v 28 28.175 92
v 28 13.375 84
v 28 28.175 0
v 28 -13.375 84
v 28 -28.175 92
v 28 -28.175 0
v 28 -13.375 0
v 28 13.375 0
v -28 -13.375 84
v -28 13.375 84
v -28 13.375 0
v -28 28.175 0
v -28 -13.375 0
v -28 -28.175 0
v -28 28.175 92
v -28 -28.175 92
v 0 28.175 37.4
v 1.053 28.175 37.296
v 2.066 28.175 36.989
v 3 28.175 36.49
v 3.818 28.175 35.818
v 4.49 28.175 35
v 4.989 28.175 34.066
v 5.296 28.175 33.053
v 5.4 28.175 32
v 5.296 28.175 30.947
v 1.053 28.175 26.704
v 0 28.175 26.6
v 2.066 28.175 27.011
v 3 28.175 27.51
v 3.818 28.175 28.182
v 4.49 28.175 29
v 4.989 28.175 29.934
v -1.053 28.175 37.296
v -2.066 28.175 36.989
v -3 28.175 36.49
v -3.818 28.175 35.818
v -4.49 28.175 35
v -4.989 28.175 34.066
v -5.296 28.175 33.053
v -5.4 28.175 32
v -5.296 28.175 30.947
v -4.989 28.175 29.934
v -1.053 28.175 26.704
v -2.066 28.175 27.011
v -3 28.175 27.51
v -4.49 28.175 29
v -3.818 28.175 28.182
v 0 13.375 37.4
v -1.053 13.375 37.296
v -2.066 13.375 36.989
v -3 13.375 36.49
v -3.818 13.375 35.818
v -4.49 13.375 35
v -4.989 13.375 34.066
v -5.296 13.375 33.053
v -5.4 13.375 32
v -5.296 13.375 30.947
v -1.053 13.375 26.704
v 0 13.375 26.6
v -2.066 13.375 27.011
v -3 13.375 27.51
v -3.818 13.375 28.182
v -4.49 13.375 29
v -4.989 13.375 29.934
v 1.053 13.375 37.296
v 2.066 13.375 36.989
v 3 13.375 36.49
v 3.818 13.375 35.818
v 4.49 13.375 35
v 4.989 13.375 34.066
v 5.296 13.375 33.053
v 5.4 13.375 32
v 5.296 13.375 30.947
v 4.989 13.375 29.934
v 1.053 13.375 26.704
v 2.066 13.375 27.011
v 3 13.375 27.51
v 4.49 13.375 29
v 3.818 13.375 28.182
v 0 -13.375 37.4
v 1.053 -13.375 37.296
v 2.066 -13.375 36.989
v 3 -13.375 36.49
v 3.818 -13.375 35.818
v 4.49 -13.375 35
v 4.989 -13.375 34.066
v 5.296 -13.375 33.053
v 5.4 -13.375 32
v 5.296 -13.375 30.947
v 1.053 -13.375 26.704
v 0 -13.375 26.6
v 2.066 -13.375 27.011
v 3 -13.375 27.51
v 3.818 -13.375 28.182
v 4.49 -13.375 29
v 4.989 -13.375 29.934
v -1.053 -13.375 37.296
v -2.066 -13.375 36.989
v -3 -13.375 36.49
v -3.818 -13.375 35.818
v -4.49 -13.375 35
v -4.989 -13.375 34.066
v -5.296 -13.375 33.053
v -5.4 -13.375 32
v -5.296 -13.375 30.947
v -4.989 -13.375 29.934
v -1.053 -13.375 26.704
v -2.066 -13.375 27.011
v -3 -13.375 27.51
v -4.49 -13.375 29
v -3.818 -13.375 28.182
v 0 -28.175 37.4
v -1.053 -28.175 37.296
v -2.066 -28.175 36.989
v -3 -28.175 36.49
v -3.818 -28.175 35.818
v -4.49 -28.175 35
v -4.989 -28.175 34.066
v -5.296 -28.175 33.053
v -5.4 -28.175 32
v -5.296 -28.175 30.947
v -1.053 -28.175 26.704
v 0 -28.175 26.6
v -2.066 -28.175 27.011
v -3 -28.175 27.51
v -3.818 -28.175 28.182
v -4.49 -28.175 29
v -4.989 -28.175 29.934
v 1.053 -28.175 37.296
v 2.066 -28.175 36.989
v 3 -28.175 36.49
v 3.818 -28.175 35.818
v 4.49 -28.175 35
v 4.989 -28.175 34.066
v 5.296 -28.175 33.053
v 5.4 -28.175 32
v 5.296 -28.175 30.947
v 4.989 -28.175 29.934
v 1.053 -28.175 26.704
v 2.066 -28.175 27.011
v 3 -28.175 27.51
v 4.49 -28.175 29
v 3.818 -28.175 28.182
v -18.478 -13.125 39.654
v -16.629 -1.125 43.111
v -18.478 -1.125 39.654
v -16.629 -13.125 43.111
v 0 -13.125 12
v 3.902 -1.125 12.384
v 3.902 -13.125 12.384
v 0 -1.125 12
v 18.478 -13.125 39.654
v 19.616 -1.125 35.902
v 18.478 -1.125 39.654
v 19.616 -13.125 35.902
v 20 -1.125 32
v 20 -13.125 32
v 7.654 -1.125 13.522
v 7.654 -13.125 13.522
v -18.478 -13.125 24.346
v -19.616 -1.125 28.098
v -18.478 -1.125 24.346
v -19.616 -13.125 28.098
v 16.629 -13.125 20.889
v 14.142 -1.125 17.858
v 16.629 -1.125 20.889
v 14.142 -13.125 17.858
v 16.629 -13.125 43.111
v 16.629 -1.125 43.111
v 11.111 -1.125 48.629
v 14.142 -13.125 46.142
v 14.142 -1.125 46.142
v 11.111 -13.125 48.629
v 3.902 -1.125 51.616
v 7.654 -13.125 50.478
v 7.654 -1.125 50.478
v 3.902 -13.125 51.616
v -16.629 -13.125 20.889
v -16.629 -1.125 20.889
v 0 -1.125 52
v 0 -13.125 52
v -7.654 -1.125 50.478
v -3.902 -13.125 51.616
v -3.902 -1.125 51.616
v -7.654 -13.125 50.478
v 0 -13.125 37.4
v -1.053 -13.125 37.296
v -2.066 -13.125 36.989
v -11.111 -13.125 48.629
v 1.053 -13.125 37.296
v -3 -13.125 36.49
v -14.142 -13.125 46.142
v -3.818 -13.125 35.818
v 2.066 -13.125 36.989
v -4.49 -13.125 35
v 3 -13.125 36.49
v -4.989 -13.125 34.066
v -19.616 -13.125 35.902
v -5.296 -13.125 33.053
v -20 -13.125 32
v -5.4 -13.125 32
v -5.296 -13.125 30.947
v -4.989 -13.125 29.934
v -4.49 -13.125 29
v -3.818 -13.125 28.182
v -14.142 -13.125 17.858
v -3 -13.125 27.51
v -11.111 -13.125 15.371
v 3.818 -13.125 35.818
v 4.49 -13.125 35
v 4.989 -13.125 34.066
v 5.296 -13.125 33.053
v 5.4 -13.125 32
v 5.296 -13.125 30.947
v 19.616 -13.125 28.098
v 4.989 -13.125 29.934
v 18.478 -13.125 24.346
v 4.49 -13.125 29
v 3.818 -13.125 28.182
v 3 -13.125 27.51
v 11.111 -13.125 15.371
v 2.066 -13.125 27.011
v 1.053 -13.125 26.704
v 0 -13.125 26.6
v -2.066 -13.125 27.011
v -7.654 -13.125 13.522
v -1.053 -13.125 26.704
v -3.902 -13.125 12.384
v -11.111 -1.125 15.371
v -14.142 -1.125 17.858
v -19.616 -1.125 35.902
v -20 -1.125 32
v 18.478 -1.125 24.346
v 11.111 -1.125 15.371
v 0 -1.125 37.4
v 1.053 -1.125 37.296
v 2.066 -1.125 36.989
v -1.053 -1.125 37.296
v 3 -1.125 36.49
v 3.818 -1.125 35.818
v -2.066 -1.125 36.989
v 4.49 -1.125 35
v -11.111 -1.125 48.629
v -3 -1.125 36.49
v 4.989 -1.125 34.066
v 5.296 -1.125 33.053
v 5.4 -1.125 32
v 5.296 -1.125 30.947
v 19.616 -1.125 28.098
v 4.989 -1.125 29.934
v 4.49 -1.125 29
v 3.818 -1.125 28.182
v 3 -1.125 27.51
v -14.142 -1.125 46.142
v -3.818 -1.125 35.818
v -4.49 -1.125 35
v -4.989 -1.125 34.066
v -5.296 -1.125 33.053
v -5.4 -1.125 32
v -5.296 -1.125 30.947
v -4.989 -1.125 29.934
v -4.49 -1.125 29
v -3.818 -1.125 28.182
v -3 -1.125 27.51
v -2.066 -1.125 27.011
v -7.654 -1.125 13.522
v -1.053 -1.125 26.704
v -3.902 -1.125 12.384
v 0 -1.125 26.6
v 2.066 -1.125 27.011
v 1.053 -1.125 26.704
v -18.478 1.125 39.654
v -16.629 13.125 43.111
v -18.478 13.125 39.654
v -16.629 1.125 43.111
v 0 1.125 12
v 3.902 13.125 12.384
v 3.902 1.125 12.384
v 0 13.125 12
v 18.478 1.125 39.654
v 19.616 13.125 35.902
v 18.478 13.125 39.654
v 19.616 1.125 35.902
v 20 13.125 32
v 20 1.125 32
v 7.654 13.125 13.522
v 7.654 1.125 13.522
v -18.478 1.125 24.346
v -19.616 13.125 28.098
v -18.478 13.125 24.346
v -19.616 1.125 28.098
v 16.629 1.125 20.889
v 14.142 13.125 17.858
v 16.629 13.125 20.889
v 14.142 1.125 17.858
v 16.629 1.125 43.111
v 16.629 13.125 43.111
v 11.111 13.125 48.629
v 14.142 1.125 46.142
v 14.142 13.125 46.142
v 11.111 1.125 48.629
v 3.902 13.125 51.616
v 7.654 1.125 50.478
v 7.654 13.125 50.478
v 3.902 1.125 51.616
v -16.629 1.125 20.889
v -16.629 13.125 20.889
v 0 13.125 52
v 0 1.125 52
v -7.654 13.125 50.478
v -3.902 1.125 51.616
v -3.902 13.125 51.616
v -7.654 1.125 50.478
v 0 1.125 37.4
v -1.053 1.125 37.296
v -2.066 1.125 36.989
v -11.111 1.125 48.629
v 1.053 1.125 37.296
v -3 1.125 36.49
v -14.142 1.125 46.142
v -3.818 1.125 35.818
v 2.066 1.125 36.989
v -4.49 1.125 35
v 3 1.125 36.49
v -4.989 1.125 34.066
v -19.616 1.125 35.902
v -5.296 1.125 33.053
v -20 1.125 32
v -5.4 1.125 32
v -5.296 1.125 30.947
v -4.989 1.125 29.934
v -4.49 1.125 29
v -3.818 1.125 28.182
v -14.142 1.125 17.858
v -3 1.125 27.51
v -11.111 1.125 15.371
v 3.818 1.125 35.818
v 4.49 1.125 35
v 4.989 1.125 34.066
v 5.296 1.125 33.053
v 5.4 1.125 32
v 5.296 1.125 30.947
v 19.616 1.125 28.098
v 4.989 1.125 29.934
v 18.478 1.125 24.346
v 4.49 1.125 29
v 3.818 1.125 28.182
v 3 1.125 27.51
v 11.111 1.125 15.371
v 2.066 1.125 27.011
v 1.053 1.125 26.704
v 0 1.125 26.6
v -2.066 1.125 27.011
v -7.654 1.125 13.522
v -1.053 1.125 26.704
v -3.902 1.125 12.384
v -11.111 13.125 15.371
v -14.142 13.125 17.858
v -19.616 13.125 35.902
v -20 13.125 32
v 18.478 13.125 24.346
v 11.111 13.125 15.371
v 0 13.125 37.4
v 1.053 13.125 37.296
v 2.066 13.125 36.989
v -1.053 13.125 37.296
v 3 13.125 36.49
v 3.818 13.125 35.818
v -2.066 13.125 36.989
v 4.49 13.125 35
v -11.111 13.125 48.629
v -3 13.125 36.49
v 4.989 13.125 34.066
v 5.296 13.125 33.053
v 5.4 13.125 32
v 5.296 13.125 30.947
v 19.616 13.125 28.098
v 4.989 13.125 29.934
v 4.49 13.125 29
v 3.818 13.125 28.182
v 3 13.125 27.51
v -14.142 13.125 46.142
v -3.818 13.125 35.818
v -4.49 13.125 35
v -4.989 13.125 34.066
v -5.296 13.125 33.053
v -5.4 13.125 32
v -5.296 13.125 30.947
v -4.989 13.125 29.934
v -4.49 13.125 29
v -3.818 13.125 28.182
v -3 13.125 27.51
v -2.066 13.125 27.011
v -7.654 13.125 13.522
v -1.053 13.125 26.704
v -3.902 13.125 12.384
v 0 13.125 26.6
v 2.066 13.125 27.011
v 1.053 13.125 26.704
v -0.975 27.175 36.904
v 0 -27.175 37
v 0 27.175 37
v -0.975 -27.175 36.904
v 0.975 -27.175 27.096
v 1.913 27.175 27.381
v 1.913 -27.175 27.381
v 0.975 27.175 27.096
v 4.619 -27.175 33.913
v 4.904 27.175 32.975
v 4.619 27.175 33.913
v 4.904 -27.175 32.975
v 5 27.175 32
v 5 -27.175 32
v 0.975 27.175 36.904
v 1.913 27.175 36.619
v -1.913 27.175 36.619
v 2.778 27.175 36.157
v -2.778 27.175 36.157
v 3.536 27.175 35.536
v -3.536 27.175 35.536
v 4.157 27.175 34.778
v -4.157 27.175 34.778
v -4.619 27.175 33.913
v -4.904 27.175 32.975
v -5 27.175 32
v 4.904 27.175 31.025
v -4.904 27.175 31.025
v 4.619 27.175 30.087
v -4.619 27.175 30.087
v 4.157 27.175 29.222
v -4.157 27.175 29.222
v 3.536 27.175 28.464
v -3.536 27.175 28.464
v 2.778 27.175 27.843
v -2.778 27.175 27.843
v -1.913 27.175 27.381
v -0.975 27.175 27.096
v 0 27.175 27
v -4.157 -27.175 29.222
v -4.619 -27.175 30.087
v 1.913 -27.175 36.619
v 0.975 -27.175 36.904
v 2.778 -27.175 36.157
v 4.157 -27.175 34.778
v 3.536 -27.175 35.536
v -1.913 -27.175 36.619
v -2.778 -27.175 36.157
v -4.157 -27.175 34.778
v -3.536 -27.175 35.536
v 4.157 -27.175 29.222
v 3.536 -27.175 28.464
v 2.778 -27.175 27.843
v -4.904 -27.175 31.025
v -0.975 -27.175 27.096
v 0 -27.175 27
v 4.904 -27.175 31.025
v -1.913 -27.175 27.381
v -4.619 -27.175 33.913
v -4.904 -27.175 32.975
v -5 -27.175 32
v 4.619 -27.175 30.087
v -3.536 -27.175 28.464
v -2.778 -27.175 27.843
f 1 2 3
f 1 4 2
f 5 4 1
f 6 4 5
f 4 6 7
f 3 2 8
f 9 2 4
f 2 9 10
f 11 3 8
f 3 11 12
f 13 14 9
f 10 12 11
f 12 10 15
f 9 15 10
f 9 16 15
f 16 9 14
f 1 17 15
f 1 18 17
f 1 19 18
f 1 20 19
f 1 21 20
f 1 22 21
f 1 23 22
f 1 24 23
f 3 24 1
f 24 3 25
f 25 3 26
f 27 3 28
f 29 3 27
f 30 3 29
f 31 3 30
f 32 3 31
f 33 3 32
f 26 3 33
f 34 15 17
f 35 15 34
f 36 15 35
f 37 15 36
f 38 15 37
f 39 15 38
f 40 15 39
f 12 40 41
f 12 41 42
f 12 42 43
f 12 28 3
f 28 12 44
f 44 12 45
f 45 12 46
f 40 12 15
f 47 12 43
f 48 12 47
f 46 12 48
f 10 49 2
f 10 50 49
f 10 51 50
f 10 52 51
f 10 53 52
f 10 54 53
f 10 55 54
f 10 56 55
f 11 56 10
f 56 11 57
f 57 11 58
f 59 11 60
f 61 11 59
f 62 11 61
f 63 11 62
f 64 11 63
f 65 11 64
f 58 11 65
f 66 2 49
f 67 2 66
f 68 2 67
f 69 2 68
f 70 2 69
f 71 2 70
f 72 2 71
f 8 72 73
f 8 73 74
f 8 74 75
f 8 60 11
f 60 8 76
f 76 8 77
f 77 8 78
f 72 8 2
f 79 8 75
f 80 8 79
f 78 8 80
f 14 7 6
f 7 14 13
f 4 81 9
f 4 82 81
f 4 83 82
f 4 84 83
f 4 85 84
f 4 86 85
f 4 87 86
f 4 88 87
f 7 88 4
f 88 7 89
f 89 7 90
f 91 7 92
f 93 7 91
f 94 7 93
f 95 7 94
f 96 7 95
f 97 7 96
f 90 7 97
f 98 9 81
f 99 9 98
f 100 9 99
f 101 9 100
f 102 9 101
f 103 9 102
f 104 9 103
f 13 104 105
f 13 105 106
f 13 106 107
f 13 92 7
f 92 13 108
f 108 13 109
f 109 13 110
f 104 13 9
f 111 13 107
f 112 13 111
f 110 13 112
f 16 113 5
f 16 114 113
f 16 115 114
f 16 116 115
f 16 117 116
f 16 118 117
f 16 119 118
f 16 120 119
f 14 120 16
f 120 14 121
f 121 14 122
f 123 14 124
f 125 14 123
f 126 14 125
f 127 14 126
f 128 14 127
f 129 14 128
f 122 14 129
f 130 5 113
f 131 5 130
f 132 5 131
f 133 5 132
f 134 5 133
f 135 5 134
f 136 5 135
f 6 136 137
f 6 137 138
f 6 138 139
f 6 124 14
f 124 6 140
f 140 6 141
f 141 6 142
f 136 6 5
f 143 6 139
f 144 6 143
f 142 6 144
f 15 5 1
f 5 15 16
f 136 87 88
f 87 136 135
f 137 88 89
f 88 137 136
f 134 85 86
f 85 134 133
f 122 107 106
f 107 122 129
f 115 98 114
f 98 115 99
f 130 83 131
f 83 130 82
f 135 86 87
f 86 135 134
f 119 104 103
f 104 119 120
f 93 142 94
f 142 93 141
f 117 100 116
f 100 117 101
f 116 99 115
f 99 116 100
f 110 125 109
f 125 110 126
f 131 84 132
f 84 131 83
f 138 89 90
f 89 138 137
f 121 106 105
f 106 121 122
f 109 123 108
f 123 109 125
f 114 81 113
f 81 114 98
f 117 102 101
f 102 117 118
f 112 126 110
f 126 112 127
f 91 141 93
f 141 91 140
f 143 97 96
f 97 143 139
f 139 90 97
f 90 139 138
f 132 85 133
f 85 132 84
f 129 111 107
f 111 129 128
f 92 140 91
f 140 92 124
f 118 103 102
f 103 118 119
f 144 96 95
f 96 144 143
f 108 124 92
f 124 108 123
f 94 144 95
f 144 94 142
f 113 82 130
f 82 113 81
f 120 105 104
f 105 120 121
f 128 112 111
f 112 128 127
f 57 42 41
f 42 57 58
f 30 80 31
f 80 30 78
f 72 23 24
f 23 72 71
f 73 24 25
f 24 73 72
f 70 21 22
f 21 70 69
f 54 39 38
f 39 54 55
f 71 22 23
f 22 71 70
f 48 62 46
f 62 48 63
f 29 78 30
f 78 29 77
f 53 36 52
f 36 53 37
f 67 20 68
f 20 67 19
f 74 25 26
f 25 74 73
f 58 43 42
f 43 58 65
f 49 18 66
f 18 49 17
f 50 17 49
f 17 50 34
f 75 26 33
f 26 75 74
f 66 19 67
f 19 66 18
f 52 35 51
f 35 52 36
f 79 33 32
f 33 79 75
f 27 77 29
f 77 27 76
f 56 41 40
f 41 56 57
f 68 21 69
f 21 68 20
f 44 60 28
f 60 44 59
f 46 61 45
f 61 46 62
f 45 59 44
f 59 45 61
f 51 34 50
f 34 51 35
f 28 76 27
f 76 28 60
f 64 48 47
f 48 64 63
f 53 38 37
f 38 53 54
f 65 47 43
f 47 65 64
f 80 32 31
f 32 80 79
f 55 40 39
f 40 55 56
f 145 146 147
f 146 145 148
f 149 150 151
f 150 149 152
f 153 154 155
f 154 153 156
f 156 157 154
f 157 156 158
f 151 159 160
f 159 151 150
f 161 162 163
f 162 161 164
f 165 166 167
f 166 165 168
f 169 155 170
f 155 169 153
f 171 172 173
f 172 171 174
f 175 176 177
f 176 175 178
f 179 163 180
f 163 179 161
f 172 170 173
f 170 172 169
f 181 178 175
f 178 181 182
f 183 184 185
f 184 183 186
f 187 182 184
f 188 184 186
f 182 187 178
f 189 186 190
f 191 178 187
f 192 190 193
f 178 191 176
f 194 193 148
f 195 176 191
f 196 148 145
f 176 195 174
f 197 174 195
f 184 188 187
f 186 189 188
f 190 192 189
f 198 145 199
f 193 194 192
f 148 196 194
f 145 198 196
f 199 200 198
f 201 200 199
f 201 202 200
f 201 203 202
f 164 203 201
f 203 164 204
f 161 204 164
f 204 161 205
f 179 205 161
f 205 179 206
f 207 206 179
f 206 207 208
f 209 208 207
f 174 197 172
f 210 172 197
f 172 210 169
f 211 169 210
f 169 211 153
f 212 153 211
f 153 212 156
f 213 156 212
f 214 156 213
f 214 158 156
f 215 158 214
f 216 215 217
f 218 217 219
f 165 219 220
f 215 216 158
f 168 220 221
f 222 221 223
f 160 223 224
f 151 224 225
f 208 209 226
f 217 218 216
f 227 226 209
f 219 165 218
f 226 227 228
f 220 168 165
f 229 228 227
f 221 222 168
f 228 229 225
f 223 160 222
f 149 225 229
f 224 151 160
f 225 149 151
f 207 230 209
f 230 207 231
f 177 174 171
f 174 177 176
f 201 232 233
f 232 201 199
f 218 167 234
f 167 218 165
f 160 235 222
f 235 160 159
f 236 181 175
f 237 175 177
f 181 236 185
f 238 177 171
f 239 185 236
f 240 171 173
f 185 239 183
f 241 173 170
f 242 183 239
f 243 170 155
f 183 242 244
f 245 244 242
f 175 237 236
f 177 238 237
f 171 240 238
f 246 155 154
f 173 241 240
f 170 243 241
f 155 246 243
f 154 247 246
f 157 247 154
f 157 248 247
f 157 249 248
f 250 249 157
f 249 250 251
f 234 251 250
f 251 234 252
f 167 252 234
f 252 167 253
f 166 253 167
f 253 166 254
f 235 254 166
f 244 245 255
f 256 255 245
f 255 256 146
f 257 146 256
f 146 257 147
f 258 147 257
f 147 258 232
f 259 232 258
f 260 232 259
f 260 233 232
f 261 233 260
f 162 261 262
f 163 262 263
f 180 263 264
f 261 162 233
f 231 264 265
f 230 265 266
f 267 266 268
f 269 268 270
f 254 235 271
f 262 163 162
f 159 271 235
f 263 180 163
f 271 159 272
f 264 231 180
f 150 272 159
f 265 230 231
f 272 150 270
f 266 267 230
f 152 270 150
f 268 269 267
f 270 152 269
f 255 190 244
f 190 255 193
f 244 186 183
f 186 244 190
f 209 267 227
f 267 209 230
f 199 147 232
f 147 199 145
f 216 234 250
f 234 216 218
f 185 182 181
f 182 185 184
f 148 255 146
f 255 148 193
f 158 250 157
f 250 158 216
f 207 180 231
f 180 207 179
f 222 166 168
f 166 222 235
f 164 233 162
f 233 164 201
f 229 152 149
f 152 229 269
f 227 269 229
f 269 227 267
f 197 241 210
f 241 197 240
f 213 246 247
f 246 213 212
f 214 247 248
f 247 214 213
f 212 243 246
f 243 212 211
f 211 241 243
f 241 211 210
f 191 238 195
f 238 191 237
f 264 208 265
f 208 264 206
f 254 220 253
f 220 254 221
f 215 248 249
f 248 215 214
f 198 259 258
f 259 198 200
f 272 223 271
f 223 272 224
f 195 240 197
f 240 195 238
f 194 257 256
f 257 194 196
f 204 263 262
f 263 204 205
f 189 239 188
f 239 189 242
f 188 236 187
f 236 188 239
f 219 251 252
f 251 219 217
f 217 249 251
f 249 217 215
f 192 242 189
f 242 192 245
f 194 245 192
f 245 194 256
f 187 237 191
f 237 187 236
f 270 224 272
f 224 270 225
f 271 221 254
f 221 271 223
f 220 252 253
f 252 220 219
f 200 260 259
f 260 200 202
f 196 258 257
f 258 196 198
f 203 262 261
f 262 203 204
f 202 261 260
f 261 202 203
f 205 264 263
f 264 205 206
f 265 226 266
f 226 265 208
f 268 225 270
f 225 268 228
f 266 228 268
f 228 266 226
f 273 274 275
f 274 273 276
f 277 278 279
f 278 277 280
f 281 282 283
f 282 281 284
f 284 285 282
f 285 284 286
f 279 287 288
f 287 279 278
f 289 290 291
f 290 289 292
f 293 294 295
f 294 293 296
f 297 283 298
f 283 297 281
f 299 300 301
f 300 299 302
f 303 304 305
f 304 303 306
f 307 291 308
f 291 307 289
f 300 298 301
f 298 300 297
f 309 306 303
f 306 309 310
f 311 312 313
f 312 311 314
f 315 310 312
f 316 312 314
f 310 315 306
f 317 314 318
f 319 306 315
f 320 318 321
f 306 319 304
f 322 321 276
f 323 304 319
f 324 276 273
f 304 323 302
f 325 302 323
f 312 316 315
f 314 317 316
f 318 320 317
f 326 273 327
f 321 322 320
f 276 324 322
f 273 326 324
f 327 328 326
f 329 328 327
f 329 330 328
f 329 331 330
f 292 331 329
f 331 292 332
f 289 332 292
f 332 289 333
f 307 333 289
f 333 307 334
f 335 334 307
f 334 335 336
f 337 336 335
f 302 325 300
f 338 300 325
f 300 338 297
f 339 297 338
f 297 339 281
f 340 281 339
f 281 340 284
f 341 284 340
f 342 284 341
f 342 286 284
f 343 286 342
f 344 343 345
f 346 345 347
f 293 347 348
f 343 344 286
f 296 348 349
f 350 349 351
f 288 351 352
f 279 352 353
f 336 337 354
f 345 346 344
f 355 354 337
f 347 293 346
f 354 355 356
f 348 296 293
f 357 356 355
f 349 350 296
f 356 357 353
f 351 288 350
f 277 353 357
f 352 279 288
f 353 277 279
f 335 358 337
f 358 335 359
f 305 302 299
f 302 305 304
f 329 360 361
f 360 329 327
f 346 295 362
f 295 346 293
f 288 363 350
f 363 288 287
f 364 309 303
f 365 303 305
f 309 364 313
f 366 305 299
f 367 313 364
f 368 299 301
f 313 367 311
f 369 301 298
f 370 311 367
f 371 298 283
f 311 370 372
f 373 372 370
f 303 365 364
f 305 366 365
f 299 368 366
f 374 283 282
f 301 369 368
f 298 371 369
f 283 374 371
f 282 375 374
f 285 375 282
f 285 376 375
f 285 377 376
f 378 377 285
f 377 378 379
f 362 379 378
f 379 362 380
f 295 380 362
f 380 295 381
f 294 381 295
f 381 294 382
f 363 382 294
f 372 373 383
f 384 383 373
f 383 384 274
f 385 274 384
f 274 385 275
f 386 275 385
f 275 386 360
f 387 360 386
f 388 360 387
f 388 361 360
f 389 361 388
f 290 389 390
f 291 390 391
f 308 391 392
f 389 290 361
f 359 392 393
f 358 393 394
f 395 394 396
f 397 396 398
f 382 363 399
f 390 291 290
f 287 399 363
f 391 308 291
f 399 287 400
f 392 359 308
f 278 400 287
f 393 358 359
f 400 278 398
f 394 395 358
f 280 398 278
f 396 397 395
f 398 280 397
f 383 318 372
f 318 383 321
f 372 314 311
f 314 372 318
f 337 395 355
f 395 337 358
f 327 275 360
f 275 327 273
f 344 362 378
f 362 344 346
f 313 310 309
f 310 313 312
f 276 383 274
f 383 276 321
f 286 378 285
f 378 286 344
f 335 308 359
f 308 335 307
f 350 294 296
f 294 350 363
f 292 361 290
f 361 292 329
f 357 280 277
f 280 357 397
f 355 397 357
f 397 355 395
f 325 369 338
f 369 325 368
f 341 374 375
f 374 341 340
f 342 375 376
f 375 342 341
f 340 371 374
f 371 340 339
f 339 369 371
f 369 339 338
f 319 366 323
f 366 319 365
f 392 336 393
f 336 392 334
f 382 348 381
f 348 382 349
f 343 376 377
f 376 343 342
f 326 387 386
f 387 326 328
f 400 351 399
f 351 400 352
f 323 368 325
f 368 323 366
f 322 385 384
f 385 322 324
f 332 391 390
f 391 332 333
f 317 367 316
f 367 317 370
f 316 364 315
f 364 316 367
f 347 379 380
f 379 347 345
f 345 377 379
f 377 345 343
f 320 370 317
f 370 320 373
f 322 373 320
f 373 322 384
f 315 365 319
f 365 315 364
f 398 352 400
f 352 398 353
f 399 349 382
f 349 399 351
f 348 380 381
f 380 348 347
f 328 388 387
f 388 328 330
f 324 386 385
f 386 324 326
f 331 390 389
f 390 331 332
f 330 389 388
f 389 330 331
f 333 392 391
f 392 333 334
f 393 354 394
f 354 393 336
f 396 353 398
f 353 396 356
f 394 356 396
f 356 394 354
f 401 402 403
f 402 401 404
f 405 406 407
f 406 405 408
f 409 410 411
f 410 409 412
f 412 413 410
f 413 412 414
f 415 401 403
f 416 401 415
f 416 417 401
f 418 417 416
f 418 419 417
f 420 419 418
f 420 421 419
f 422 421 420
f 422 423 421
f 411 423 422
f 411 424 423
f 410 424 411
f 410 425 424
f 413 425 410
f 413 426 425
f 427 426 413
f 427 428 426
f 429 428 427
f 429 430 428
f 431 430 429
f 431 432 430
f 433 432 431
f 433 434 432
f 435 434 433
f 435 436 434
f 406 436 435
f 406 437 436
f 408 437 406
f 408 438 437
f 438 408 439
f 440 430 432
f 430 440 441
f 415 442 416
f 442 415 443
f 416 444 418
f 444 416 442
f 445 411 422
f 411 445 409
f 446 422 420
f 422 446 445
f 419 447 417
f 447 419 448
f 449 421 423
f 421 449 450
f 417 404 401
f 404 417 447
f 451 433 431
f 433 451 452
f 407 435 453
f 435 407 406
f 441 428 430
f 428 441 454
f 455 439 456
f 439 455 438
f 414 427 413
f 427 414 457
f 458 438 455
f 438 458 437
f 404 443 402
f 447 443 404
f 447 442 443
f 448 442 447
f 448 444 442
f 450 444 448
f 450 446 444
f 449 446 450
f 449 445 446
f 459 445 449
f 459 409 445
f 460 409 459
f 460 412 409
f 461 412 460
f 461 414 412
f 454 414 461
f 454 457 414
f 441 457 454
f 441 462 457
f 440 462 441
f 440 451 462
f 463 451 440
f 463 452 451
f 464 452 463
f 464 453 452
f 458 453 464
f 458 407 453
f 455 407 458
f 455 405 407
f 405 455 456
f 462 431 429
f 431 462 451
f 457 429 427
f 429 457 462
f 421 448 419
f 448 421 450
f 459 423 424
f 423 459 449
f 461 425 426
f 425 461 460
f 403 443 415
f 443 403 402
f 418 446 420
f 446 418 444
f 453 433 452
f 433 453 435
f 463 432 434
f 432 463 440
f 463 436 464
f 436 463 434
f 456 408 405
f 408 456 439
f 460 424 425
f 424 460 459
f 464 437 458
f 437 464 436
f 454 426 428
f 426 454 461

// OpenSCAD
$fn = 32;

// ------------------------------------------------------------------------
// Trolley wheel set: wheels d40, fork 84 mm tall
// Every part is its own module, assembly() places every instance.
// ------------------------------------------------------------------------

// --- part 1 ---
module trolley_fork() {
  difference() {
    union() {
      translate([-28, 13.375, 0]) cube([56, 14.8, 84]);
      translate([-28, -28.175, 0]) cube([56, 14.8, 84]);
      translate([-28, -28.175, 84]) cube([56, 56.35, 8]);
    }
    translate([0, -20.775, 32]) rotate([90, 0, 0]) cylinder(h = 16.8, d = 10.8, center = true);
    translate([0, 20.775, 32]) rotate([90, 0, 0]) cylinder(h = 16.8, d = 10.8, center = true);
  }
}

// --- part 2 ---
module trolley_wheel() {
  difference() {
      translate([0, 0, 0]) cylinder(h = 12, d = 40);
      translate([0, 0, -1]) cylinder(h = 14, d = 10.8);
    }
}

// --- part 3 ---
module trolley_axle() {
  translate([0, 0, -27.175]) cylinder(h = 54.35, d = 10);
}

// --- assembly ---
module assembly() {
  color([0.80, 0.24, 0.20]) translate([0, 0, 0]) rotate([0, 0, 0]) trolley_fork();
  color([0.20, 0.45, 0.75]) translate([0, -1.125, 32]) rotate([90, 0, 0]) trolley_wheel();
  color([0.25, 0.62, 0.32]) translate([0, 13.125, 32]) rotate([90, 0, 0]) trolley_wheel();
  color([0.92, 0.70, 0.18]) translate([0, 0, 32]) rotate([90, 0, 0]) trolley_axle();
}

assembly();
